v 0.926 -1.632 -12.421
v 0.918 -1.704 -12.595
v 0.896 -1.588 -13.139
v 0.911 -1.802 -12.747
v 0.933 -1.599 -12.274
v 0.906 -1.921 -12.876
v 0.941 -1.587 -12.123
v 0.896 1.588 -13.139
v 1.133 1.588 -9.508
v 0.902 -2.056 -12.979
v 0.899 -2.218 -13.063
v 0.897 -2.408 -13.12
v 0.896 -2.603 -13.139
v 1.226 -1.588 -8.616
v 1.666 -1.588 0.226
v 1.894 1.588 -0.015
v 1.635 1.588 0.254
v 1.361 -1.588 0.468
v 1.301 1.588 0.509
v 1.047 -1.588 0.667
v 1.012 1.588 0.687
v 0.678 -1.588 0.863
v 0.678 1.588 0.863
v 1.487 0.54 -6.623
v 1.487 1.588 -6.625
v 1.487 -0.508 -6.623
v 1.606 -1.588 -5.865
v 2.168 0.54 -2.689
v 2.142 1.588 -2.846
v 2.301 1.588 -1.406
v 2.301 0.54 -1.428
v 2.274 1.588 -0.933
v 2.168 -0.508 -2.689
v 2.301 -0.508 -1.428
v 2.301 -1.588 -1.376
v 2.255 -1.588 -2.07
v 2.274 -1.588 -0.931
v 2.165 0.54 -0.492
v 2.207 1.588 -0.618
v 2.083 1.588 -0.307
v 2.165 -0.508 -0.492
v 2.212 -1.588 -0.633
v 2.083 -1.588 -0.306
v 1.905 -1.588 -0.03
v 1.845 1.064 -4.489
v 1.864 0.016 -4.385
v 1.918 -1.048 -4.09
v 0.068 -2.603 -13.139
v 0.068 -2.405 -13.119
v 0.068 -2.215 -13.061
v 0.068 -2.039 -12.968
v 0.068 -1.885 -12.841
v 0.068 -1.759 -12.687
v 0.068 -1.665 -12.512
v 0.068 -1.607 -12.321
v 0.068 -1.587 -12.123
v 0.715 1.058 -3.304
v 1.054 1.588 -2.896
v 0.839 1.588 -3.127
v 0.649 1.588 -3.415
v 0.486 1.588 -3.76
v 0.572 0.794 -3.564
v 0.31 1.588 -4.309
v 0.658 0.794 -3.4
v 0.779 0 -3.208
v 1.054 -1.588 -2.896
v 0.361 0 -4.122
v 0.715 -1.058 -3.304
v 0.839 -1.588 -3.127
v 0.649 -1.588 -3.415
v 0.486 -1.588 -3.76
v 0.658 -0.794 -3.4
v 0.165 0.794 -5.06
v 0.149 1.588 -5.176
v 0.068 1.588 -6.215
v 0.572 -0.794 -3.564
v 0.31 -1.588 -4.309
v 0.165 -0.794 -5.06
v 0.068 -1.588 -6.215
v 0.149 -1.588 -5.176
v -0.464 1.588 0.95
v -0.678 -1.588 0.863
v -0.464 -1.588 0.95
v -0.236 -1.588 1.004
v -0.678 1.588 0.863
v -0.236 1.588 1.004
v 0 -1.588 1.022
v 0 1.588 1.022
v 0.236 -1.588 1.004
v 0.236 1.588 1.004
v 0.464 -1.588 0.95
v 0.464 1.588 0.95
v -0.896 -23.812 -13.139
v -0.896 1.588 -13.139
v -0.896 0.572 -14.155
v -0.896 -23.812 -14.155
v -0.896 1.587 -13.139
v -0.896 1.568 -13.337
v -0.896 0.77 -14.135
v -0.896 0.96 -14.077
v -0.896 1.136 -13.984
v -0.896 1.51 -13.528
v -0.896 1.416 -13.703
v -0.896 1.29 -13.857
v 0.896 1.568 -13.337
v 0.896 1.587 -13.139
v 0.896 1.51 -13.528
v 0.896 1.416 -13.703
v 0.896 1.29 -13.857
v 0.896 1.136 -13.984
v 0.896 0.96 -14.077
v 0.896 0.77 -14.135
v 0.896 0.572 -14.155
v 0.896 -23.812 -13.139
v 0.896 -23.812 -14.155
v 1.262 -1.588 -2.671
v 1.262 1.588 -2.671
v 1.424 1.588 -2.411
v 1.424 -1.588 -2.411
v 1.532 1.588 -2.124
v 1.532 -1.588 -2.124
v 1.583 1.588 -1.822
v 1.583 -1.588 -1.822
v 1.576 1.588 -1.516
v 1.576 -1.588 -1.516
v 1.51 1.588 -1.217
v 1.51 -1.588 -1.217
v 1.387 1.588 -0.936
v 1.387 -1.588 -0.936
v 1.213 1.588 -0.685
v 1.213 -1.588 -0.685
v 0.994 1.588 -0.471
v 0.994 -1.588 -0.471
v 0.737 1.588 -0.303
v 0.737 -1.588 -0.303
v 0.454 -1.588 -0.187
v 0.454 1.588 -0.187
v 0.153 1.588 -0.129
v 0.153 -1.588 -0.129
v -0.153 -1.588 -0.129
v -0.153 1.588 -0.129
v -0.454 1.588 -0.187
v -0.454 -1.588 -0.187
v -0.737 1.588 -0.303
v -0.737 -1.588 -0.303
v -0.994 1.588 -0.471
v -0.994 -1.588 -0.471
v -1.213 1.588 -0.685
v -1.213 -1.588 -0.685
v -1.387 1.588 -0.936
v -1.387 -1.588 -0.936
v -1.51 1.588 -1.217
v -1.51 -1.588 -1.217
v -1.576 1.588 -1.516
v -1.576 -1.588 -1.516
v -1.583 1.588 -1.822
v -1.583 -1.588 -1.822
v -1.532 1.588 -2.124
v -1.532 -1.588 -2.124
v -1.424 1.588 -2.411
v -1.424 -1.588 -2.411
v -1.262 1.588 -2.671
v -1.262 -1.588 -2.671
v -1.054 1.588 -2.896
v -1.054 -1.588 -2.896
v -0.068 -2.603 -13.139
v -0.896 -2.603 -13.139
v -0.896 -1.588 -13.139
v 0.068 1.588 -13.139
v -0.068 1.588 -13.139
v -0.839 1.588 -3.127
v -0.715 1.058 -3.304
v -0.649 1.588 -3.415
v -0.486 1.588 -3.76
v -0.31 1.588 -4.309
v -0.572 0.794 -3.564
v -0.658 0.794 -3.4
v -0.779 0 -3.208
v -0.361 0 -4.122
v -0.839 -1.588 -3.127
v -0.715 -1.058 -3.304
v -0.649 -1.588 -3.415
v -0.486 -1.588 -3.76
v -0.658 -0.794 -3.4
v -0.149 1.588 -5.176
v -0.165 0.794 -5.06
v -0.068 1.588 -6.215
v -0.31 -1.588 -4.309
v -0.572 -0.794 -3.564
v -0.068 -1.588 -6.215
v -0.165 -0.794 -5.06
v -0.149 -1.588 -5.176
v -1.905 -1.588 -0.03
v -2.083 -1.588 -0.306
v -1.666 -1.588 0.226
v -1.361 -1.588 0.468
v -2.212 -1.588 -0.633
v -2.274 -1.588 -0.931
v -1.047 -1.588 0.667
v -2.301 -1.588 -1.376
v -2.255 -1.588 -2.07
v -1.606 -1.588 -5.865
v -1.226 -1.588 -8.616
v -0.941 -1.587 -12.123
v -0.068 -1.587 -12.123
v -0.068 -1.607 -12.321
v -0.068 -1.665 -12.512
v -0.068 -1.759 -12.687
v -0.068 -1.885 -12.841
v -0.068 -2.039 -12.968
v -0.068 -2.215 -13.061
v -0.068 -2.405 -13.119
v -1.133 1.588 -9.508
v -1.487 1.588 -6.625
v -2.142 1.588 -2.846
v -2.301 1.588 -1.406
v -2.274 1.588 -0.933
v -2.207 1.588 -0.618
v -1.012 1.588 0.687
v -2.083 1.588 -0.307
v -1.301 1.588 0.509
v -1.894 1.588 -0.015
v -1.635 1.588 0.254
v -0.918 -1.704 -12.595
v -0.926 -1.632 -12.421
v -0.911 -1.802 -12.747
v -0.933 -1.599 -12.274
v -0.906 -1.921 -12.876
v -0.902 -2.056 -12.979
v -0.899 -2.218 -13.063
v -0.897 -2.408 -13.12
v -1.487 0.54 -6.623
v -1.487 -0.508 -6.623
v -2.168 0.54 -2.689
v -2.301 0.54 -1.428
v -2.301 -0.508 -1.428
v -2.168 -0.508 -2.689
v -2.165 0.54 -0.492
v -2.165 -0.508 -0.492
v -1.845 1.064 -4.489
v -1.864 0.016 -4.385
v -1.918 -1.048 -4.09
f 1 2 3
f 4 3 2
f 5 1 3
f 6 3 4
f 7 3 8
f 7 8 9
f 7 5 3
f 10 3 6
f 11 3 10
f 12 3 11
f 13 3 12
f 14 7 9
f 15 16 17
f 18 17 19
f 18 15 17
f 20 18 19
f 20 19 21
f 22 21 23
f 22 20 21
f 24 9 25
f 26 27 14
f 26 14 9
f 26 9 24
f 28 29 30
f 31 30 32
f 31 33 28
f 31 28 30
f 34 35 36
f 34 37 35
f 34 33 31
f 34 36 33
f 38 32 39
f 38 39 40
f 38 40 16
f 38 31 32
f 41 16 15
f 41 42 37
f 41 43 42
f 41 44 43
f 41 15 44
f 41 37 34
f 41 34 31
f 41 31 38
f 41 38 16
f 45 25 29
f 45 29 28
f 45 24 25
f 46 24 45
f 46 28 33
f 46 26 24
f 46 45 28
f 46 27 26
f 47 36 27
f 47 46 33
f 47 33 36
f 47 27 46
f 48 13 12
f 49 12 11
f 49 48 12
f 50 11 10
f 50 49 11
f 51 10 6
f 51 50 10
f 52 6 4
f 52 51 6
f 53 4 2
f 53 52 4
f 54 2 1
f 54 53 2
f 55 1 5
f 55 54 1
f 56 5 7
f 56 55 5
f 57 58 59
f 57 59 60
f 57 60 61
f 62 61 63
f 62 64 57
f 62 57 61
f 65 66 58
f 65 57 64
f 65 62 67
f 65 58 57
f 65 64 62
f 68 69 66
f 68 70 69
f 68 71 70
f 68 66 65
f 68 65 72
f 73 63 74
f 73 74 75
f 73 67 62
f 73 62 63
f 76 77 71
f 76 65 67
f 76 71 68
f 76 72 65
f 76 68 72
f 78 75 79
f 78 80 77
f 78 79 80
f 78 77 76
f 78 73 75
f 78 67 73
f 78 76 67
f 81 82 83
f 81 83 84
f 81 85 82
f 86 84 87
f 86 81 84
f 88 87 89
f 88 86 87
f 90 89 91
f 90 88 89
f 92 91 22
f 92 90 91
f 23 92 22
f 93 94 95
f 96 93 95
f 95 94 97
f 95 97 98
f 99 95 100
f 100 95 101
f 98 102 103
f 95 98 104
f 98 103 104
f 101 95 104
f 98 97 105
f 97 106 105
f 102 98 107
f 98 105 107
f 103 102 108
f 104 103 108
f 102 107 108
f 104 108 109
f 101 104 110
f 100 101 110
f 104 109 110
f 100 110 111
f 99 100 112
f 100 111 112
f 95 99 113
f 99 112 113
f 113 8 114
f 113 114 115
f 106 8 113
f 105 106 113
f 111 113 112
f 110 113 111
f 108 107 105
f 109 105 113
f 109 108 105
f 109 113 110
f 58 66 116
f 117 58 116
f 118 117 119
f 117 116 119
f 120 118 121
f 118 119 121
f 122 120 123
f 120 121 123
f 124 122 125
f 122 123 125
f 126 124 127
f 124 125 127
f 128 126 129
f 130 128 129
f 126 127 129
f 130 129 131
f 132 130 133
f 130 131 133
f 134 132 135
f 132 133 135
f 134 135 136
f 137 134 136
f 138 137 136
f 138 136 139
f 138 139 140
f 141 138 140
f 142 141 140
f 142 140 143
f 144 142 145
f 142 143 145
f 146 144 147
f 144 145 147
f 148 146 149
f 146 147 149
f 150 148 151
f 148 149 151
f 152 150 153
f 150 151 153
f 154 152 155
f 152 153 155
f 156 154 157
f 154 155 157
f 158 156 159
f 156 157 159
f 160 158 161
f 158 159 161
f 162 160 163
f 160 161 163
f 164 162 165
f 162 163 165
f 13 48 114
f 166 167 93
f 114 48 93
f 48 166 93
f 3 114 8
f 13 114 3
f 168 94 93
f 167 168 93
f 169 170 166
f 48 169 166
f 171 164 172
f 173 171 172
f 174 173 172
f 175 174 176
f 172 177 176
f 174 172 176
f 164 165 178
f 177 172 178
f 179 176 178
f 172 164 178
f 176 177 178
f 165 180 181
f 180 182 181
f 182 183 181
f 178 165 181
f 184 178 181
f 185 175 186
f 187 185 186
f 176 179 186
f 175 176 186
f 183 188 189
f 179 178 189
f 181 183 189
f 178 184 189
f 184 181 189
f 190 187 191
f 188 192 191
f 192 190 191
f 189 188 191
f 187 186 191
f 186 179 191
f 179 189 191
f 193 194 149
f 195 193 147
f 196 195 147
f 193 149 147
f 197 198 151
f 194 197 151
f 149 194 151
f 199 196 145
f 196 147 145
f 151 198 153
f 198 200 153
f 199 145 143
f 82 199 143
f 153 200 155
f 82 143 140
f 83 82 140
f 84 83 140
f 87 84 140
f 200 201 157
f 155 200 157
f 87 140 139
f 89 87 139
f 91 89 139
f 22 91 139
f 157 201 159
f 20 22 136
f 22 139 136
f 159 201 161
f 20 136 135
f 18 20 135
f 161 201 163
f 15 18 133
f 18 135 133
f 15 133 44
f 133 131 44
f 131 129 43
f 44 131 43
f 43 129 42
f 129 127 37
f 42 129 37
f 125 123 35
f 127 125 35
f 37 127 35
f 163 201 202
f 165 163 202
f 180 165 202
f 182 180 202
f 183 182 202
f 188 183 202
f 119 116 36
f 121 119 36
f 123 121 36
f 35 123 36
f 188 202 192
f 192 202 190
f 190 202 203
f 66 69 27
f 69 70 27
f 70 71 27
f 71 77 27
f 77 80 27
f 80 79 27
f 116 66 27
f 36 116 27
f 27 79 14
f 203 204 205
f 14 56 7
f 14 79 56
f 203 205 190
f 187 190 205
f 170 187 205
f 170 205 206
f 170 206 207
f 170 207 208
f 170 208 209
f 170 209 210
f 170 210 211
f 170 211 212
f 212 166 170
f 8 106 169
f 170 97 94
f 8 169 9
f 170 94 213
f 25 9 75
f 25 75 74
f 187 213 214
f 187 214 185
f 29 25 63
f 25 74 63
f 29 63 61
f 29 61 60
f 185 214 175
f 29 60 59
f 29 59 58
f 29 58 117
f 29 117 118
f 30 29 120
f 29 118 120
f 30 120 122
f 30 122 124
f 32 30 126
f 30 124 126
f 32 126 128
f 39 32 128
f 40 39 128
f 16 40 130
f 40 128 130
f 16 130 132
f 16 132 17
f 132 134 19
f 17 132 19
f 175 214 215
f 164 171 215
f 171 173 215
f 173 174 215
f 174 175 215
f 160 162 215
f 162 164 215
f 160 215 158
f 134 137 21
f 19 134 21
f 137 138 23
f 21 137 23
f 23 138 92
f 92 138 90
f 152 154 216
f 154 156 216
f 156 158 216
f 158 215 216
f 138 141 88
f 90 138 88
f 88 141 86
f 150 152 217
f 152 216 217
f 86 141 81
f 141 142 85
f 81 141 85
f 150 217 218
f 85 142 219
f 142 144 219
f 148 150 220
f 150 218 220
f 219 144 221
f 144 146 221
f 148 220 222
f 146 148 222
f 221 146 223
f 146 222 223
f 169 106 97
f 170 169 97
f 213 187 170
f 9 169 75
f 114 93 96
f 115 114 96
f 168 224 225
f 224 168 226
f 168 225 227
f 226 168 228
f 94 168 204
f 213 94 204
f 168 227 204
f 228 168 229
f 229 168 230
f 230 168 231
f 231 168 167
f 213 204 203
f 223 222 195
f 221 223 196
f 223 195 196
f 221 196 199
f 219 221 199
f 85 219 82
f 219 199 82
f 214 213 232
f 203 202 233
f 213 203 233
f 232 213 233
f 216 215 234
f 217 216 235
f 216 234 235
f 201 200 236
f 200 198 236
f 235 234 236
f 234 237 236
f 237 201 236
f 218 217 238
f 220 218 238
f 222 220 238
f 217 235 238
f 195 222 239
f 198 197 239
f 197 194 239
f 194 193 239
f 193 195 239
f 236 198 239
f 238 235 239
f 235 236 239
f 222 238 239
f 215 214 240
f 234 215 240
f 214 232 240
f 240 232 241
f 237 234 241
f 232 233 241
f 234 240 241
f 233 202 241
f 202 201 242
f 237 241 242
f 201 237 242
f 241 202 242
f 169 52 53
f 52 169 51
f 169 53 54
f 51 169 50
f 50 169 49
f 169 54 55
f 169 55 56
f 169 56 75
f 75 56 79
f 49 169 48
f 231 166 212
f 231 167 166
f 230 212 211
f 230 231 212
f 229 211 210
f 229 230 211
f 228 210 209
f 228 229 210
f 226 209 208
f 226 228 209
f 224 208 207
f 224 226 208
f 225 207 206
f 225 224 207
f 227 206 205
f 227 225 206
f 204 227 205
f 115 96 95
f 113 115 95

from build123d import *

# Parameters (mm, degrees)
BOSS_EXTRUDE1_DEPTH      = 1.5875
BOSS_EXTRUDE1_DEPTH_BACK = 1.5875
FILLET1_R                = 1.524
BOSS_EXTRUDE2_DEPTH      = 0.89581
BOSS_EXTRUDE2_DEPTH_BACK = 0.89581
FILLET2_R                = 1.016


with BuildPart() as part:
    # Sketch1 → Boss-Extrude1 (new, two sides: drawn at the far end of the back side and taken through both)
    with BuildSketch(Plane(origin=(0, 0, 0), x_dir=(1, 0, 0), z_dir=(0, 1, 0)).offset(-BOSS_EXTRUDE1_DEPTH_BACK)):
        with BuildLine():
            Line((-0.068296764, 6.214618695), (-0.068296764, 13.138711739))
            Line((-0.068296764, 13.138711739), (-0.895808533, 13.138711739))
            add(Edge.make_bspline(
                [(-0.895808533, 13.138711739), (-1.210074473, 4.57087153), (-2.777608758, 1.083562638), (-3.277136157, 0.201945645), (0, -1.169953638)],
                knots=[0, 0, 0, 0, 0, 1, 1, 1, 1, 1], degree=4))
            add(Edge.make_bspline(
                [(0.895808533, 13.138711739), (1.210074473, 4.57087153), (2.777608758, 1.083562638), (3.277136157, 0.201945645), (0, -1.169953638)],
                knots=[0, 0, 0, 0, 0, 1, 1, 1, 1, 1], degree=4))
            Line((0.895808533, 13.138711739), (0.068296764, 13.138711739))
            Line((0.068296764, 13.138711739), (0.068296764, 6.214618695))
            add(Edge.make_bspline(
                [(1.054098961, 2.89573812), (0.161537854, 3.688347072), (0.068296764, 6.214618695)],
                knots=[0, 0, 0, 1, 1, 1], degree=2))
            ThreePointArc((1.054098961, 2.89573812), (0, 0.121211739), (-1.054098961, 2.89573812))
            add(Edge.make_bspline(
                [(-1.054098961, 2.89573812), (-0.161537854, 3.688347072), (-0.068296764, 6.214618695)],
                knots=[0, 0, 0, 1, 1, 1], degree=2))
        make_face()
    extrude(amount=BOSS_EXTRUDE1_DEPTH + BOSS_EXTRUDE1_DEPTH_BACK)

    # Fillet1
    fillet1_edges = [part.edges().sort_by_distance(p)[0] for p in [
        (0, -0.79375, 1.169953638),
    ]]
    fillet(fillet1_edges, radius=FILLET1_R)

    # Sketch2 → Boss-Extrude2 (add, two sides: drawn at the far end of the back side and taken through both)
    with BuildSketch(Plane(origin=(0, 0, 0), x_dir=(0, 0, -1), z_dir=(1, 0, 0)).offset(-BOSS_EXTRUDE2_DEPTH_BACK)):
        Polygon((13.138711739, 1.5875), (13.138711739, -1.5875), (13.138711739, -23.8125), (14.154711739, -23.8125), (14.154711739, 1.5875), align=None)
    extrude(amount=BOSS_EXTRUDE2_DEPTH + BOSS_EXTRUDE2_DEPTH_BACK)

    # Fillet2
    fillet2_edges = [part.edges().sort_by_distance(p)[0] for p in [
        (0, 1.5875, -14.154711739),
        (0.482052648, -1.5875, -13.138711739),
        (-0.482052648, -1.5875, -13.138711739),
    ]]
    fillet(fillet2_edges, radius=FILLET2_R - 0.0001)  # a hair under: the kernel refuses the full size


solid = part.part
